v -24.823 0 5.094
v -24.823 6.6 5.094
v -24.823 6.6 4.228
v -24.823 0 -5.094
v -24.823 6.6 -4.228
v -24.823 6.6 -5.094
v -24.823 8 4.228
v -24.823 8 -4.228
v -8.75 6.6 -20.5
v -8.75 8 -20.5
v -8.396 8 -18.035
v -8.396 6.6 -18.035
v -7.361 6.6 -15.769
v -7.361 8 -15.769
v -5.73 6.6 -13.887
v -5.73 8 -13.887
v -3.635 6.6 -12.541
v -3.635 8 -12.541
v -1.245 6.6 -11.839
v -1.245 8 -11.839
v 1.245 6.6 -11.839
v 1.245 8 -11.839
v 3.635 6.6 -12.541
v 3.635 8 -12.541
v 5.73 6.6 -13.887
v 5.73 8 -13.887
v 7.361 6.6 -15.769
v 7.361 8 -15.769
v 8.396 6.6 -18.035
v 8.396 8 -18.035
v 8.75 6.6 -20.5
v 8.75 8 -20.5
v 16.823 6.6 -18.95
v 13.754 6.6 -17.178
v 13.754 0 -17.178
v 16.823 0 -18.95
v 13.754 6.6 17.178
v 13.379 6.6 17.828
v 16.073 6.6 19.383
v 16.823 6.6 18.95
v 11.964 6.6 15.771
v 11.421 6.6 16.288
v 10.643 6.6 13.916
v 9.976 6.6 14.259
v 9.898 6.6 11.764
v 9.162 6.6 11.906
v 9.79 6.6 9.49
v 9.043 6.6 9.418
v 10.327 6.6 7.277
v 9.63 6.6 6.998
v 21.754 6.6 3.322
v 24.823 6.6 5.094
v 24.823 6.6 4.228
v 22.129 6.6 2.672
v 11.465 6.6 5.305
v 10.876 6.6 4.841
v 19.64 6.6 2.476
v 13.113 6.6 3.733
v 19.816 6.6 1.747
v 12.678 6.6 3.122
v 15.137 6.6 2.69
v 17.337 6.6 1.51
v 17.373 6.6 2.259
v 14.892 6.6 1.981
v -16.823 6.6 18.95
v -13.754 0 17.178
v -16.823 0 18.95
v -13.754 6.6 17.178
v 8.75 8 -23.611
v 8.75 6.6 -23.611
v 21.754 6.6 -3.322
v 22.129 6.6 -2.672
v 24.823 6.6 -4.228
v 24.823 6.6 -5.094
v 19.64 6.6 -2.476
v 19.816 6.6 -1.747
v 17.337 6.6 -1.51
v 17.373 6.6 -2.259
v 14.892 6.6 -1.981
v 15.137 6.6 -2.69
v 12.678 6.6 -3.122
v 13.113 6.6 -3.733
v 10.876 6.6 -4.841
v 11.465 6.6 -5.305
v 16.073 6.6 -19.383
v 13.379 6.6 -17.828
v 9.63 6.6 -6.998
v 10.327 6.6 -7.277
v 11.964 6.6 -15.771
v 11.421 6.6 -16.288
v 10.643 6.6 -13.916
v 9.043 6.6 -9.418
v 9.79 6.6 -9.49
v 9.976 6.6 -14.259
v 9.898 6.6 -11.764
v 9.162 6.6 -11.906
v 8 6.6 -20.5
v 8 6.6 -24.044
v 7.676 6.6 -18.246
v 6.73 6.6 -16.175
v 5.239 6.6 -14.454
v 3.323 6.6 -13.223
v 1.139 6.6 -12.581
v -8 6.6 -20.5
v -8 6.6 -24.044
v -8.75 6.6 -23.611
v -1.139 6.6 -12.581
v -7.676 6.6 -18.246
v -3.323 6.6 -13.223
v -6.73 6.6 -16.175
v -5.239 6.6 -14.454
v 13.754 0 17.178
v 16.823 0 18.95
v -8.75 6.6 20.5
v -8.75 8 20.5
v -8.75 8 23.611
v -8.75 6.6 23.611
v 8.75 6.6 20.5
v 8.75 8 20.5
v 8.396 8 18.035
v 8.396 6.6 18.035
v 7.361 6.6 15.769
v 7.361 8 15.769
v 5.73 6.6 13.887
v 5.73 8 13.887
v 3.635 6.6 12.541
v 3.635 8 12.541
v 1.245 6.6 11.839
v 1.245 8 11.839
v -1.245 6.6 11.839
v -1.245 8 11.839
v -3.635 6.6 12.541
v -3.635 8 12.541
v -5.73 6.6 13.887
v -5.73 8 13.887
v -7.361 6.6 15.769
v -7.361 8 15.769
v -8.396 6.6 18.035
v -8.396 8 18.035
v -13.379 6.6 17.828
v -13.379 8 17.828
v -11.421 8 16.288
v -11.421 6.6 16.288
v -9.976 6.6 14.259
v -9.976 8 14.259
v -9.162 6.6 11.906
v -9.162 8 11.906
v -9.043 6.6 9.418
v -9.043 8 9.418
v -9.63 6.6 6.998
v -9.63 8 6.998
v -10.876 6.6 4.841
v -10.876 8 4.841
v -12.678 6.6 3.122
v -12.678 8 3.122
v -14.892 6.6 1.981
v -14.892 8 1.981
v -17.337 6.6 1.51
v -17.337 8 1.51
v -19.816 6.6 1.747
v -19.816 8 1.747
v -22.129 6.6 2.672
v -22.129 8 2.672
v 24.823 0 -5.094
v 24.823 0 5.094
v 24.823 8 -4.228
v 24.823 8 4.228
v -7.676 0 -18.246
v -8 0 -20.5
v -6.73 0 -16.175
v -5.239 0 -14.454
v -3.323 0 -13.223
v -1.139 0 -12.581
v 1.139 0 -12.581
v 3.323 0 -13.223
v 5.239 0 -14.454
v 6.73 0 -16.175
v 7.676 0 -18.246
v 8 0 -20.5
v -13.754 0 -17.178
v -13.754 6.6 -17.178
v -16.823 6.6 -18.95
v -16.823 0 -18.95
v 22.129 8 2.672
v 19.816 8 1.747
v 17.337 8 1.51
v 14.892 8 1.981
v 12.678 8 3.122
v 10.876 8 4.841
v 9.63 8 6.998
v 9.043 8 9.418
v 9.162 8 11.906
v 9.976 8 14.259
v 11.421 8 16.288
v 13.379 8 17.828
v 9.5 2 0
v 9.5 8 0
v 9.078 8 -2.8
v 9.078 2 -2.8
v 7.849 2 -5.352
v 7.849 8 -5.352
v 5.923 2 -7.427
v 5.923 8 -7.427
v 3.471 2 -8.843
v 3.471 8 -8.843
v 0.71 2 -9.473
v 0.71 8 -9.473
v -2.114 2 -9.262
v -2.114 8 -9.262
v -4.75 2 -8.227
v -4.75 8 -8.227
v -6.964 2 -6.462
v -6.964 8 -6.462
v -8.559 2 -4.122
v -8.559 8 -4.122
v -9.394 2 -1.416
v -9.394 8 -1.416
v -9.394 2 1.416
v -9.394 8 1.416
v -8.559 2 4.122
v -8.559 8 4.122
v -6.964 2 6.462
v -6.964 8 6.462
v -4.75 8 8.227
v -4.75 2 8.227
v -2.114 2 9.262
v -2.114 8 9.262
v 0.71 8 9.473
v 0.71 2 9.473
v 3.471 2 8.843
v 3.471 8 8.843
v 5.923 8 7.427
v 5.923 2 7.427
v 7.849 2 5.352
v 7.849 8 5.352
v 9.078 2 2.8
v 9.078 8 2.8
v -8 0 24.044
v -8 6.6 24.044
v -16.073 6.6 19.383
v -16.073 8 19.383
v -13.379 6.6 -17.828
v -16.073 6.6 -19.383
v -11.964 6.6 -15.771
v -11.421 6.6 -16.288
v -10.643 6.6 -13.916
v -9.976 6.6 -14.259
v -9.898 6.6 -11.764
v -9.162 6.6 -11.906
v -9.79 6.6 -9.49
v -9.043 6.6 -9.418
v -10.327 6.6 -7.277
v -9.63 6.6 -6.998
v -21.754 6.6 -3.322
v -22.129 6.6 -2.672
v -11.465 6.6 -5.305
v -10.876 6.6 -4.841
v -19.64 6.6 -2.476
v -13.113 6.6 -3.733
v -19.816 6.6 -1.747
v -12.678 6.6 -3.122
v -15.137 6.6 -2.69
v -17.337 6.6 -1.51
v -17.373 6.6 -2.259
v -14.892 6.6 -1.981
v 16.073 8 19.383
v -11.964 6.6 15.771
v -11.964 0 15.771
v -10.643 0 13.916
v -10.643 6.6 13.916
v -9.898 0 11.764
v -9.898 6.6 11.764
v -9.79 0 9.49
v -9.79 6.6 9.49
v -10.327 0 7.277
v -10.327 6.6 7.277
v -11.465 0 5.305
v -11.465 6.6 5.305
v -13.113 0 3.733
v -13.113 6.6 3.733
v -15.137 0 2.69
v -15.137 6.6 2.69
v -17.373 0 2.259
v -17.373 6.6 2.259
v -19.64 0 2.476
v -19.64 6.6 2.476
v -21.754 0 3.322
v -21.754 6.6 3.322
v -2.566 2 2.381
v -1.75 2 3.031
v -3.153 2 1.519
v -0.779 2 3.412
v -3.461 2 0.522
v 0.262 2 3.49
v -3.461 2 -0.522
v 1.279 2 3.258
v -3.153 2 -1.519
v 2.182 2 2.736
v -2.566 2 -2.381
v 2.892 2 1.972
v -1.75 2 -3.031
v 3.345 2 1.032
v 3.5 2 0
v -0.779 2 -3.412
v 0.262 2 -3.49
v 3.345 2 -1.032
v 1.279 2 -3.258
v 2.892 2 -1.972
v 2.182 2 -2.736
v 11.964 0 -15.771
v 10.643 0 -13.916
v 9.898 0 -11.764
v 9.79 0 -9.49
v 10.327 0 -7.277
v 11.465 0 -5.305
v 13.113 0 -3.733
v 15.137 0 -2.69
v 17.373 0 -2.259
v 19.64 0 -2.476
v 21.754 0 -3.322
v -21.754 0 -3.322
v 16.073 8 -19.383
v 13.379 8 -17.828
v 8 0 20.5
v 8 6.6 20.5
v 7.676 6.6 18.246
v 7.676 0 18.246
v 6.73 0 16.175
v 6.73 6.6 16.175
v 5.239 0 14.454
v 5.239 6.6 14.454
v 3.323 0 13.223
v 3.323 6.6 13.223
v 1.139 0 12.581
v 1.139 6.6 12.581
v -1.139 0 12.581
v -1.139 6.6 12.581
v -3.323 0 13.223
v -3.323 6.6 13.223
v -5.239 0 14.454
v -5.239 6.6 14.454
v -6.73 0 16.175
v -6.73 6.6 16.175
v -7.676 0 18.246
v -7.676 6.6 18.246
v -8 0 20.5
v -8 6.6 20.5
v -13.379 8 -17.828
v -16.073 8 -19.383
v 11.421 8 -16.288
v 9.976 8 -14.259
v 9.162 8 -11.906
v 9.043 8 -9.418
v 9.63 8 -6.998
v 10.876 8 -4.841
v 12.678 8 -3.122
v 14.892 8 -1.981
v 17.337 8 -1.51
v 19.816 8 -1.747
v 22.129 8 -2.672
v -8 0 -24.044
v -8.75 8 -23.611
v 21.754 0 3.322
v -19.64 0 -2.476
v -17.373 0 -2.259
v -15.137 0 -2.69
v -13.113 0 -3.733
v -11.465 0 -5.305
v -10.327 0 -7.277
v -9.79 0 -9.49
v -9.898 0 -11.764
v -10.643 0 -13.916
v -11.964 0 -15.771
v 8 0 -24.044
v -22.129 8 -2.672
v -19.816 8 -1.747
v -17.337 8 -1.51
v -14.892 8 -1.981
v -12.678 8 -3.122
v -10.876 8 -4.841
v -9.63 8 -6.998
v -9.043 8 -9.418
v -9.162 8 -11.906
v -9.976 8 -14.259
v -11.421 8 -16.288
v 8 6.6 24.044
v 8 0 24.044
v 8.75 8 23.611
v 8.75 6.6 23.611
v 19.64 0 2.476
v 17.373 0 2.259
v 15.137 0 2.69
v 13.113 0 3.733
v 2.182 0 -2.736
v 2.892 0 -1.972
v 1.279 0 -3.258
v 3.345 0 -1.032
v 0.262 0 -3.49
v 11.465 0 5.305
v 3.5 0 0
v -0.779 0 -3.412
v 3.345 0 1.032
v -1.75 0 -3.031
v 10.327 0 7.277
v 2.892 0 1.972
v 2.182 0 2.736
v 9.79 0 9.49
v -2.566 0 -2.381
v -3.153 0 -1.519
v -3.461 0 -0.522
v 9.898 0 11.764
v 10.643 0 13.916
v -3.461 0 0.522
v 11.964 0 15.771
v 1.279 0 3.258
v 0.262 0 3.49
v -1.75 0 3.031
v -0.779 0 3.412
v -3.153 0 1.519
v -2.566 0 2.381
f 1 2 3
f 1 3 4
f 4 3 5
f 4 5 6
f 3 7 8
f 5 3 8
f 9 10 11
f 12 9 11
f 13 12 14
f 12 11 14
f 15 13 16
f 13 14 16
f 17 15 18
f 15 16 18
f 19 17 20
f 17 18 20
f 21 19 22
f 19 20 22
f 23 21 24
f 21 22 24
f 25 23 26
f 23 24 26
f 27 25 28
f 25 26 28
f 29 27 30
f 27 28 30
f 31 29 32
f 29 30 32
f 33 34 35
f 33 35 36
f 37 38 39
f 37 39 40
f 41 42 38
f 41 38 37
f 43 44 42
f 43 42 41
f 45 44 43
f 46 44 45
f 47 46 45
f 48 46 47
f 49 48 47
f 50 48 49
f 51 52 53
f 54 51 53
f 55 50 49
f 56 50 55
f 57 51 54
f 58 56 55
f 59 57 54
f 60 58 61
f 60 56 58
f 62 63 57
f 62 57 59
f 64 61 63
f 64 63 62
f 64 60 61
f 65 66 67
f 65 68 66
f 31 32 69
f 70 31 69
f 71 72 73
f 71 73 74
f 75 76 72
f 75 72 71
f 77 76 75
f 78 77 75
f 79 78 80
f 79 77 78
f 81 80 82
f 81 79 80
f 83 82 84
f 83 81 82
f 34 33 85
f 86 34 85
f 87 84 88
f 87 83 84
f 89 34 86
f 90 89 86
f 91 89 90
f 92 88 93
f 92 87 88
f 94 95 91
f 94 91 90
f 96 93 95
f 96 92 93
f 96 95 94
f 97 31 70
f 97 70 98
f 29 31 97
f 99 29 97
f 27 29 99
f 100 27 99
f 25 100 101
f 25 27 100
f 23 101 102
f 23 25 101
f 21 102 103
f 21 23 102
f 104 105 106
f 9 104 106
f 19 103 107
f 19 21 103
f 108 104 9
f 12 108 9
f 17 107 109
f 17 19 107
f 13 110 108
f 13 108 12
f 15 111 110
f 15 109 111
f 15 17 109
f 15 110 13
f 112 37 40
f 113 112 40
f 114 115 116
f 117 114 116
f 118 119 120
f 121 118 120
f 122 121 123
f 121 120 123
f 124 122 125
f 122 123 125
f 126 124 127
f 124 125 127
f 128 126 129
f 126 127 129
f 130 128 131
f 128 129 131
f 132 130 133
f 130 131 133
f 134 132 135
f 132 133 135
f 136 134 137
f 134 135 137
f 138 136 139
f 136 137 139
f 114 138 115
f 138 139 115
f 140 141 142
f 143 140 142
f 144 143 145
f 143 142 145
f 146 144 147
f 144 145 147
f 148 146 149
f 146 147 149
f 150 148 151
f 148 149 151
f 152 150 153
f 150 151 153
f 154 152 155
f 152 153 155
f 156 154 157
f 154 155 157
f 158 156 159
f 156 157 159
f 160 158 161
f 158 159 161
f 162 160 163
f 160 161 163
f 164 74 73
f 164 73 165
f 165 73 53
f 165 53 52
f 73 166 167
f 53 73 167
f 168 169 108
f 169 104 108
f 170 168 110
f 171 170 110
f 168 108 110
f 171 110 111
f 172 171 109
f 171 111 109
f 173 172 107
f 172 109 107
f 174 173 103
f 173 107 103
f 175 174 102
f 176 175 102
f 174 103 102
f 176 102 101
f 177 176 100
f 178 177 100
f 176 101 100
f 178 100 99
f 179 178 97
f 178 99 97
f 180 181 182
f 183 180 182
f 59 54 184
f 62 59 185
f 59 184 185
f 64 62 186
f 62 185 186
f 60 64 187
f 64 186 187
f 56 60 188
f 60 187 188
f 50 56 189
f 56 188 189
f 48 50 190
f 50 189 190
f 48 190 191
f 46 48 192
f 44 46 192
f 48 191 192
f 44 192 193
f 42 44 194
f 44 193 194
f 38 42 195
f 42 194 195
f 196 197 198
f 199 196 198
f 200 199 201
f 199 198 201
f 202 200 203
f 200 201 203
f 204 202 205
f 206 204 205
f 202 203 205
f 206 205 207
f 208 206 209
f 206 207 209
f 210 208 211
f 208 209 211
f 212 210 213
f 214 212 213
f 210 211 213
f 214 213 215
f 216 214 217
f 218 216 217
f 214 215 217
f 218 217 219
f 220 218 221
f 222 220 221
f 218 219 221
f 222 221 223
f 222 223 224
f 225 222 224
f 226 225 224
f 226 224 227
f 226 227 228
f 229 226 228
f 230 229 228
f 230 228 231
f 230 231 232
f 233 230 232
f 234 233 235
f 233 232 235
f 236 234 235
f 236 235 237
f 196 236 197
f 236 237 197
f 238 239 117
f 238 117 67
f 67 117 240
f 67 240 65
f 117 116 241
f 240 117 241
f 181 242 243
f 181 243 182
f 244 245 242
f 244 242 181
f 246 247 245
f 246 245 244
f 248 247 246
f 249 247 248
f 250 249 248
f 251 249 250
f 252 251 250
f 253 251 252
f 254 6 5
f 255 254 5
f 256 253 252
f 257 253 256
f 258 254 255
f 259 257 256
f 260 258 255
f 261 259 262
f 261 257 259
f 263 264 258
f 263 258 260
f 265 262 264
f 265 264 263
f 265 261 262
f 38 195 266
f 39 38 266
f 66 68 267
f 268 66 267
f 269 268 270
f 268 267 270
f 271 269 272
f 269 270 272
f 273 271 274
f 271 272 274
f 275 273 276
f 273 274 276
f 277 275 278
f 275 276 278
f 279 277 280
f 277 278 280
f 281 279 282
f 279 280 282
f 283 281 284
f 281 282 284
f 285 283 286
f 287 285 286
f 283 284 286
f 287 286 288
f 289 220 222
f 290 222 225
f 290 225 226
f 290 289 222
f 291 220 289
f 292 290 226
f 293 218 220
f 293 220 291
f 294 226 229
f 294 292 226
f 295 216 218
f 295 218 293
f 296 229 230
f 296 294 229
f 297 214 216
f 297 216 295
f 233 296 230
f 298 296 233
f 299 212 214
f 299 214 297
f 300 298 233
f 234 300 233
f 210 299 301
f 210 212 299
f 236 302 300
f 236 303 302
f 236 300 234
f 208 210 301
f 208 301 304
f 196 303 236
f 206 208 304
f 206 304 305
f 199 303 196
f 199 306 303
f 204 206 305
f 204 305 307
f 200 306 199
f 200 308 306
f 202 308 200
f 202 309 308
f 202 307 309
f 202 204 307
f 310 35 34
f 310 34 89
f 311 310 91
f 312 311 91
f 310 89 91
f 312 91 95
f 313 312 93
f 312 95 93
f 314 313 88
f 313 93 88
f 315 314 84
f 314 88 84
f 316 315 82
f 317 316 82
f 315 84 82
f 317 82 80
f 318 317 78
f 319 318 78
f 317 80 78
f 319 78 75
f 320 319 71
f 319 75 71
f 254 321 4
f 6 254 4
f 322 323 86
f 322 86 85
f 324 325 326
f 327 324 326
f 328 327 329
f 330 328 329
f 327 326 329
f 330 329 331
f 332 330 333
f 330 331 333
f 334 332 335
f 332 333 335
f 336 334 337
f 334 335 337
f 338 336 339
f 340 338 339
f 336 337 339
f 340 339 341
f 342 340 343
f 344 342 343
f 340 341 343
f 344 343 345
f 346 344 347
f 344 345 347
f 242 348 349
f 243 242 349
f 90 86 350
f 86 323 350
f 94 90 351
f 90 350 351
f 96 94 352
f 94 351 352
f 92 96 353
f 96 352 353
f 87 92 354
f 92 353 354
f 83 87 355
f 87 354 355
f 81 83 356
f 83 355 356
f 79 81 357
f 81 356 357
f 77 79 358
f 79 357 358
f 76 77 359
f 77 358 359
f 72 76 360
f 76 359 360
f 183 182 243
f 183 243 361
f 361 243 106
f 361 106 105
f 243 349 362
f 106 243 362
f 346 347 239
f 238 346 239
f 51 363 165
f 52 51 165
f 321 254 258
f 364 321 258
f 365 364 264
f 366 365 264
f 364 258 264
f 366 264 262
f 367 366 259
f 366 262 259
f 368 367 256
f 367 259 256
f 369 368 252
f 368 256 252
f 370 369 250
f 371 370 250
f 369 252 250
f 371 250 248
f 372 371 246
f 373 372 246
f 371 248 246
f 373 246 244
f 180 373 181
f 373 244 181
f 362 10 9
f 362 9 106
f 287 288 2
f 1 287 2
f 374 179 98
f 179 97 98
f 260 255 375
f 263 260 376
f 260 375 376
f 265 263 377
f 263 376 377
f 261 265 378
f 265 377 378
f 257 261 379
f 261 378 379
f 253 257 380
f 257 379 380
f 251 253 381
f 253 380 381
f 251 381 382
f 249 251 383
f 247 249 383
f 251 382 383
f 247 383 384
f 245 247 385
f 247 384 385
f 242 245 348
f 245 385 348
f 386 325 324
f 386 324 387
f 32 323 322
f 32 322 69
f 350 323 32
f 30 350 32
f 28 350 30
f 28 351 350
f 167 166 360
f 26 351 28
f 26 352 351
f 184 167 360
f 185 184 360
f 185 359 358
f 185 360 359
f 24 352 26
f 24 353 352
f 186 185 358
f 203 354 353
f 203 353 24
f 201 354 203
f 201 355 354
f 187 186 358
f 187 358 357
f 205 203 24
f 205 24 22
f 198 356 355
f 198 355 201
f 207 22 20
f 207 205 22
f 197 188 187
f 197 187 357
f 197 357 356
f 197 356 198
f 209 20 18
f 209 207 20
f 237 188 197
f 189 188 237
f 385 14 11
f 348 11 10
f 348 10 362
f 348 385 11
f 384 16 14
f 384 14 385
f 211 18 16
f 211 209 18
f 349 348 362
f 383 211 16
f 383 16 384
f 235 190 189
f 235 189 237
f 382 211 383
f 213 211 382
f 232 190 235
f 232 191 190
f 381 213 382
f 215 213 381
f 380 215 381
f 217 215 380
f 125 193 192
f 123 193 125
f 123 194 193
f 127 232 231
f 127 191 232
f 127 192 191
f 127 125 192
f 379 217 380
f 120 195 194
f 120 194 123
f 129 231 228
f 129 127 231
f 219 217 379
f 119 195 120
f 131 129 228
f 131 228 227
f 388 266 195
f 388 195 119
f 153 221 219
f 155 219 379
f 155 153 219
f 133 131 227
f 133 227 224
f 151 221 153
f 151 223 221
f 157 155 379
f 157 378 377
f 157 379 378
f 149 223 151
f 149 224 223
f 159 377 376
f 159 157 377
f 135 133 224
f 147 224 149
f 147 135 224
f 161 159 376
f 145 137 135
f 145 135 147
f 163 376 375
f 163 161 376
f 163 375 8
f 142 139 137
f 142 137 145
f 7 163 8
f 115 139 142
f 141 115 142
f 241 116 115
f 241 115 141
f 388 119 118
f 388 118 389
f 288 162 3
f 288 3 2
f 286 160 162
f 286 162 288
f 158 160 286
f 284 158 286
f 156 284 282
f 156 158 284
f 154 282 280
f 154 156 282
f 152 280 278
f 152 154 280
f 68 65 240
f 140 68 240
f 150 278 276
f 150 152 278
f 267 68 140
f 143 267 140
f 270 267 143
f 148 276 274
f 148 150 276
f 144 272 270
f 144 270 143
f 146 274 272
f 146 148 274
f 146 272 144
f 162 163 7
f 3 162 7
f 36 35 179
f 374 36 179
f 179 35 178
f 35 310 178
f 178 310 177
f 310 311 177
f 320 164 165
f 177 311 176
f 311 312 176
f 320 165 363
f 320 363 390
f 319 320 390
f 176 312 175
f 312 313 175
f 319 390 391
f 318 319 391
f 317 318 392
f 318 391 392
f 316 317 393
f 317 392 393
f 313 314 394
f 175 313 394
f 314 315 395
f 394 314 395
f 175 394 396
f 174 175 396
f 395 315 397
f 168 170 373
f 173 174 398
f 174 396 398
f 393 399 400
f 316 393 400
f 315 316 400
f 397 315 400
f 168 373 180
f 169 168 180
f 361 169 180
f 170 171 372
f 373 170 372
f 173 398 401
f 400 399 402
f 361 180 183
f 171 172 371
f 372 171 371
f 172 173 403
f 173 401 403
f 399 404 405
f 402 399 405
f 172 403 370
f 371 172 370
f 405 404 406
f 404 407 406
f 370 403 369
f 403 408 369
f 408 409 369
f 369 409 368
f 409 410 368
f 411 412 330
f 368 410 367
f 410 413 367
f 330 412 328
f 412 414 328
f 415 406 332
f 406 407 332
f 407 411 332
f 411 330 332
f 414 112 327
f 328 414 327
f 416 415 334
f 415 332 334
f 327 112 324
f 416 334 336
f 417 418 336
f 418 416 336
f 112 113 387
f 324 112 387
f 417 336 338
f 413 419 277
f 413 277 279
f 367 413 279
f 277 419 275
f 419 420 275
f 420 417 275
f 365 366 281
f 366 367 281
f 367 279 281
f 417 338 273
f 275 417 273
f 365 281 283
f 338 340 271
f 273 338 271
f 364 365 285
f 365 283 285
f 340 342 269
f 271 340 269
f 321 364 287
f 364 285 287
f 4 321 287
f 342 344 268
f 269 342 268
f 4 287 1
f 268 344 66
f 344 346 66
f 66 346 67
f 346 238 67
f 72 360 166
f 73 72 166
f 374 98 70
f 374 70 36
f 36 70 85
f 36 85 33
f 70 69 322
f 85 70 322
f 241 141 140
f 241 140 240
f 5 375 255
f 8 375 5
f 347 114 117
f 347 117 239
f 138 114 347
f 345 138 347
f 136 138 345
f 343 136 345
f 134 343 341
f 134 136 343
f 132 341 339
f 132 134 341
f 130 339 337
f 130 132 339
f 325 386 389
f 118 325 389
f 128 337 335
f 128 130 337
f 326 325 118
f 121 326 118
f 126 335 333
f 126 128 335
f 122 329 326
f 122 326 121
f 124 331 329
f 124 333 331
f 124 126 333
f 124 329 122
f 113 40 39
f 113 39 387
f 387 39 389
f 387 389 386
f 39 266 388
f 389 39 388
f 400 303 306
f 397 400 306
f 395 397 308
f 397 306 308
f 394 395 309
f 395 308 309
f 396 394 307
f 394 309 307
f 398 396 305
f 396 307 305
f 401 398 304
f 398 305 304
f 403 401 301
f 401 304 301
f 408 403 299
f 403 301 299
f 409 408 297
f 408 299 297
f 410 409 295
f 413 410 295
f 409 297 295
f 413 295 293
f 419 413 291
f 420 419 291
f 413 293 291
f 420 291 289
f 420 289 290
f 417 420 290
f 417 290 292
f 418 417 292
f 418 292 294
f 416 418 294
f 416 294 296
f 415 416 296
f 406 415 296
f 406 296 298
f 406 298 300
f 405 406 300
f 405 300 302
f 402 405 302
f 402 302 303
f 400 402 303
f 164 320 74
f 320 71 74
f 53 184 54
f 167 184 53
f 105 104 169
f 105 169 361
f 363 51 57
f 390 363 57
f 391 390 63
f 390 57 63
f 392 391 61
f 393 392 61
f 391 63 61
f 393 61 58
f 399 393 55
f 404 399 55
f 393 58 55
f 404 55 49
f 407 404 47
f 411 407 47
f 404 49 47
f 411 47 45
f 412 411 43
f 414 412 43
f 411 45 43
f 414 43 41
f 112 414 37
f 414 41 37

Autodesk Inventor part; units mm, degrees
ref_plane "YZ Plane" through (0, 0, 0) normal (1, 0, 0) x (0, 1, 0)
ref_plane "XZ Plane" through (0, 0, 0) normal (0, 1, 0) x (-1, 0, 0)
ref_plane "XY Plane" through (0, 0, 0) normal (0, 0, 1) x (1, 0, 0)
sketch "Sketch1" plane through (0, 0, 0) normal (0, 1, 0) x (-1, 0, 0)
  circle A0 centre (0, 0) radius 30
  circle A1 centre (0, 20.5) radius 8.75
  circle A2 centre (-17.7535, 10.25) radius 8.75
  circle A3 centre (-17.7535, -10.25) radius 8.75
  circle A4 centre (0, -20.5) radius 8.75
  circle A5 centre (17.7535, -10.25) radius 8.75
  circle A6 centre (17.7535, 10.25) radius 8.75
  circle A7 centre (20.5, 0) radius 7.5
  circle A8 centre (14.4957, 14.4957) radius 7.5
  circle A9 centre (0, 20.5) radius 7.5
  circle A10 centre (-14.4957, 14.4957) radius 7.5
  circle A11 centre (-20.5, 0) radius 7.5
  circle A12 centre (-14.4957, -14.4957) radius 7.5
  circle A13 centre (0, -20.5) radius 7.5
  circle A14 centre (14.4957, -14.4957) radius 7.5
  dimension "d0" = 60
  dimension "d19" = 17.5
  dimension "d20" = 20.5
  dimension "d23" = 360
  dimension "d25" = 15
  dimension "d26" = 20.5
  dimension "d29" = 360
extrude "Extrusion1" add sketch "Sketch1" along normal blind 8 contours A0 | A1 A8 A10 | A10 A1 | A1 A10 A2 | A8 A6 A1 | A1 A8 | A1 A8 A6 A7 A5 A14 A4 A12 A3 A11 A2 A10 | A10 A2 A11 | A2 A10 | A8 A6 | A6 A7 A8 | A11 A2 | A2 A11 A3 | A11 A3 A12 | A3 A11 | A7 A6 | A6 A7 A5 | A12 A3 | A3 A12 A4 | A7 A5 A14 | A5 A7 | A12 A4 A14 | A4 A12 | A14 A5 | A5 A14 A4 | A4 A14 | A9 | A13
sketch "Sketch2" plane through (0, 8, 0) normal (0, 1, 0) x (1, 0, 0)
  circle A0 centre (0, -20.5) radius 8.75
  line L0 (-8.75, -20.5) -> (-8.75, -28.6956)
  line L1 (8.75, -20.5) -> (8.75, -28.6956)
  circle A1 centre (0, 0) radius 30 projected
  dimension "d3" = 17.5
  dimension "d4" = 20.5
extrude "Extrusion2" cut sketch "Sketch2" against normal blind 1.4 contours A0 | L1 A1 L0 A0 picked at (-5.5585, -28.7503)
sketch "Sketch3" plane through (0, 6.6, 20.5) normal (0, 1, 0) x (-1, 0, 0)
  arc A0 (-8.75, 0) -> (8.75, 0) centre (0, 0) ccw projected
  circle A1 centre (0, 0) radius 8
  line L0 (8, 0) -> (8, 8.4137)
  line L1 (-8, 0) -> (-8, 8.4137)
  arc A2 (8.75, 8.1956) -> (-8.75, 8.1956) centre (0, -20.5) ccw projected
  dimension "d7" = 16
extrude "Extrusion3" cut sketch "Sketch3" against normal through all
pattern_circular "Circular Pattern1" count 6 over 360 about axis through (0, 0, 0) along (0, 1, 0) of "Extrusion2", "Extrusion3"
sketch "Sketch7" plane through (0, 8, 0) normal (0, 1, 0) x (1, 0, 0)
  arc A0 (8, -20.5) -> (-8, -20.5) centre (0, -20.5) ccw projected
  circle A1 centre (0, -20.5) radius 8.75
  arc A2 (-13.7535, -17.1782) -> (-21.7535, -3.3218) centre (-17.7535, -10.25) ccw projected
  circle A3 centre (-17.7535, -10.25) radius 8.75
  line L0 (-21.04, -21.385) -> (-13.7535, -17.1782) projected
  line L1 (-8, -28.9137) -> (-8, -20.5) projected
  line L2 (-8, -24.0444) -> (-16.823, -18.9504)
  arc A4 (-20.4761, -21.9255) -> (-8.75, -28.6956) centre (0, 0) ccw projected
  arc A5 (-21.04, -21.385) -> (-20.4761, -21.9255) centre (0, 0) ccw projected
  arc A6 (-8.75, -28.6956) -> (-8, -28.9137) centre (0, 0) ccw projected
  dimension "d32" = 17.5
  dimension "d33" = 17.5
extrude "Extrusion6" cut sketch "Sketch7" against normal blind 10 contours L1 A6 A4 A5 L0 L2
pattern_circular "Circular Pattern2" count 6 over 360 about axis through (0, -10, 0) along (0, 1, 0) of "Extrusion6"
sketch "Sketch4" plane through (0, 8, 0) normal (0, 1, 0) x (1, 0, 0)
  circle A0 centre (0, 0) radius 3.5
  dimension "d13" = 7
extrude "Extrusion4" cut sketch "Sketch4" against normal through all
sketch "Sketch8" plane through (0, 8, 0) normal (0, 1, 0) x (1, 0, 0)
  circle A0 centre (0, 0) radius 9.5
  dimension "d39" = 19
extrude "Extrusion7" cut sketch "Sketch8" against normal blind 6
equation "\"d26\" = d20"
equation "\"d4\" = d20"
properties part number "motor_3DPrint"
